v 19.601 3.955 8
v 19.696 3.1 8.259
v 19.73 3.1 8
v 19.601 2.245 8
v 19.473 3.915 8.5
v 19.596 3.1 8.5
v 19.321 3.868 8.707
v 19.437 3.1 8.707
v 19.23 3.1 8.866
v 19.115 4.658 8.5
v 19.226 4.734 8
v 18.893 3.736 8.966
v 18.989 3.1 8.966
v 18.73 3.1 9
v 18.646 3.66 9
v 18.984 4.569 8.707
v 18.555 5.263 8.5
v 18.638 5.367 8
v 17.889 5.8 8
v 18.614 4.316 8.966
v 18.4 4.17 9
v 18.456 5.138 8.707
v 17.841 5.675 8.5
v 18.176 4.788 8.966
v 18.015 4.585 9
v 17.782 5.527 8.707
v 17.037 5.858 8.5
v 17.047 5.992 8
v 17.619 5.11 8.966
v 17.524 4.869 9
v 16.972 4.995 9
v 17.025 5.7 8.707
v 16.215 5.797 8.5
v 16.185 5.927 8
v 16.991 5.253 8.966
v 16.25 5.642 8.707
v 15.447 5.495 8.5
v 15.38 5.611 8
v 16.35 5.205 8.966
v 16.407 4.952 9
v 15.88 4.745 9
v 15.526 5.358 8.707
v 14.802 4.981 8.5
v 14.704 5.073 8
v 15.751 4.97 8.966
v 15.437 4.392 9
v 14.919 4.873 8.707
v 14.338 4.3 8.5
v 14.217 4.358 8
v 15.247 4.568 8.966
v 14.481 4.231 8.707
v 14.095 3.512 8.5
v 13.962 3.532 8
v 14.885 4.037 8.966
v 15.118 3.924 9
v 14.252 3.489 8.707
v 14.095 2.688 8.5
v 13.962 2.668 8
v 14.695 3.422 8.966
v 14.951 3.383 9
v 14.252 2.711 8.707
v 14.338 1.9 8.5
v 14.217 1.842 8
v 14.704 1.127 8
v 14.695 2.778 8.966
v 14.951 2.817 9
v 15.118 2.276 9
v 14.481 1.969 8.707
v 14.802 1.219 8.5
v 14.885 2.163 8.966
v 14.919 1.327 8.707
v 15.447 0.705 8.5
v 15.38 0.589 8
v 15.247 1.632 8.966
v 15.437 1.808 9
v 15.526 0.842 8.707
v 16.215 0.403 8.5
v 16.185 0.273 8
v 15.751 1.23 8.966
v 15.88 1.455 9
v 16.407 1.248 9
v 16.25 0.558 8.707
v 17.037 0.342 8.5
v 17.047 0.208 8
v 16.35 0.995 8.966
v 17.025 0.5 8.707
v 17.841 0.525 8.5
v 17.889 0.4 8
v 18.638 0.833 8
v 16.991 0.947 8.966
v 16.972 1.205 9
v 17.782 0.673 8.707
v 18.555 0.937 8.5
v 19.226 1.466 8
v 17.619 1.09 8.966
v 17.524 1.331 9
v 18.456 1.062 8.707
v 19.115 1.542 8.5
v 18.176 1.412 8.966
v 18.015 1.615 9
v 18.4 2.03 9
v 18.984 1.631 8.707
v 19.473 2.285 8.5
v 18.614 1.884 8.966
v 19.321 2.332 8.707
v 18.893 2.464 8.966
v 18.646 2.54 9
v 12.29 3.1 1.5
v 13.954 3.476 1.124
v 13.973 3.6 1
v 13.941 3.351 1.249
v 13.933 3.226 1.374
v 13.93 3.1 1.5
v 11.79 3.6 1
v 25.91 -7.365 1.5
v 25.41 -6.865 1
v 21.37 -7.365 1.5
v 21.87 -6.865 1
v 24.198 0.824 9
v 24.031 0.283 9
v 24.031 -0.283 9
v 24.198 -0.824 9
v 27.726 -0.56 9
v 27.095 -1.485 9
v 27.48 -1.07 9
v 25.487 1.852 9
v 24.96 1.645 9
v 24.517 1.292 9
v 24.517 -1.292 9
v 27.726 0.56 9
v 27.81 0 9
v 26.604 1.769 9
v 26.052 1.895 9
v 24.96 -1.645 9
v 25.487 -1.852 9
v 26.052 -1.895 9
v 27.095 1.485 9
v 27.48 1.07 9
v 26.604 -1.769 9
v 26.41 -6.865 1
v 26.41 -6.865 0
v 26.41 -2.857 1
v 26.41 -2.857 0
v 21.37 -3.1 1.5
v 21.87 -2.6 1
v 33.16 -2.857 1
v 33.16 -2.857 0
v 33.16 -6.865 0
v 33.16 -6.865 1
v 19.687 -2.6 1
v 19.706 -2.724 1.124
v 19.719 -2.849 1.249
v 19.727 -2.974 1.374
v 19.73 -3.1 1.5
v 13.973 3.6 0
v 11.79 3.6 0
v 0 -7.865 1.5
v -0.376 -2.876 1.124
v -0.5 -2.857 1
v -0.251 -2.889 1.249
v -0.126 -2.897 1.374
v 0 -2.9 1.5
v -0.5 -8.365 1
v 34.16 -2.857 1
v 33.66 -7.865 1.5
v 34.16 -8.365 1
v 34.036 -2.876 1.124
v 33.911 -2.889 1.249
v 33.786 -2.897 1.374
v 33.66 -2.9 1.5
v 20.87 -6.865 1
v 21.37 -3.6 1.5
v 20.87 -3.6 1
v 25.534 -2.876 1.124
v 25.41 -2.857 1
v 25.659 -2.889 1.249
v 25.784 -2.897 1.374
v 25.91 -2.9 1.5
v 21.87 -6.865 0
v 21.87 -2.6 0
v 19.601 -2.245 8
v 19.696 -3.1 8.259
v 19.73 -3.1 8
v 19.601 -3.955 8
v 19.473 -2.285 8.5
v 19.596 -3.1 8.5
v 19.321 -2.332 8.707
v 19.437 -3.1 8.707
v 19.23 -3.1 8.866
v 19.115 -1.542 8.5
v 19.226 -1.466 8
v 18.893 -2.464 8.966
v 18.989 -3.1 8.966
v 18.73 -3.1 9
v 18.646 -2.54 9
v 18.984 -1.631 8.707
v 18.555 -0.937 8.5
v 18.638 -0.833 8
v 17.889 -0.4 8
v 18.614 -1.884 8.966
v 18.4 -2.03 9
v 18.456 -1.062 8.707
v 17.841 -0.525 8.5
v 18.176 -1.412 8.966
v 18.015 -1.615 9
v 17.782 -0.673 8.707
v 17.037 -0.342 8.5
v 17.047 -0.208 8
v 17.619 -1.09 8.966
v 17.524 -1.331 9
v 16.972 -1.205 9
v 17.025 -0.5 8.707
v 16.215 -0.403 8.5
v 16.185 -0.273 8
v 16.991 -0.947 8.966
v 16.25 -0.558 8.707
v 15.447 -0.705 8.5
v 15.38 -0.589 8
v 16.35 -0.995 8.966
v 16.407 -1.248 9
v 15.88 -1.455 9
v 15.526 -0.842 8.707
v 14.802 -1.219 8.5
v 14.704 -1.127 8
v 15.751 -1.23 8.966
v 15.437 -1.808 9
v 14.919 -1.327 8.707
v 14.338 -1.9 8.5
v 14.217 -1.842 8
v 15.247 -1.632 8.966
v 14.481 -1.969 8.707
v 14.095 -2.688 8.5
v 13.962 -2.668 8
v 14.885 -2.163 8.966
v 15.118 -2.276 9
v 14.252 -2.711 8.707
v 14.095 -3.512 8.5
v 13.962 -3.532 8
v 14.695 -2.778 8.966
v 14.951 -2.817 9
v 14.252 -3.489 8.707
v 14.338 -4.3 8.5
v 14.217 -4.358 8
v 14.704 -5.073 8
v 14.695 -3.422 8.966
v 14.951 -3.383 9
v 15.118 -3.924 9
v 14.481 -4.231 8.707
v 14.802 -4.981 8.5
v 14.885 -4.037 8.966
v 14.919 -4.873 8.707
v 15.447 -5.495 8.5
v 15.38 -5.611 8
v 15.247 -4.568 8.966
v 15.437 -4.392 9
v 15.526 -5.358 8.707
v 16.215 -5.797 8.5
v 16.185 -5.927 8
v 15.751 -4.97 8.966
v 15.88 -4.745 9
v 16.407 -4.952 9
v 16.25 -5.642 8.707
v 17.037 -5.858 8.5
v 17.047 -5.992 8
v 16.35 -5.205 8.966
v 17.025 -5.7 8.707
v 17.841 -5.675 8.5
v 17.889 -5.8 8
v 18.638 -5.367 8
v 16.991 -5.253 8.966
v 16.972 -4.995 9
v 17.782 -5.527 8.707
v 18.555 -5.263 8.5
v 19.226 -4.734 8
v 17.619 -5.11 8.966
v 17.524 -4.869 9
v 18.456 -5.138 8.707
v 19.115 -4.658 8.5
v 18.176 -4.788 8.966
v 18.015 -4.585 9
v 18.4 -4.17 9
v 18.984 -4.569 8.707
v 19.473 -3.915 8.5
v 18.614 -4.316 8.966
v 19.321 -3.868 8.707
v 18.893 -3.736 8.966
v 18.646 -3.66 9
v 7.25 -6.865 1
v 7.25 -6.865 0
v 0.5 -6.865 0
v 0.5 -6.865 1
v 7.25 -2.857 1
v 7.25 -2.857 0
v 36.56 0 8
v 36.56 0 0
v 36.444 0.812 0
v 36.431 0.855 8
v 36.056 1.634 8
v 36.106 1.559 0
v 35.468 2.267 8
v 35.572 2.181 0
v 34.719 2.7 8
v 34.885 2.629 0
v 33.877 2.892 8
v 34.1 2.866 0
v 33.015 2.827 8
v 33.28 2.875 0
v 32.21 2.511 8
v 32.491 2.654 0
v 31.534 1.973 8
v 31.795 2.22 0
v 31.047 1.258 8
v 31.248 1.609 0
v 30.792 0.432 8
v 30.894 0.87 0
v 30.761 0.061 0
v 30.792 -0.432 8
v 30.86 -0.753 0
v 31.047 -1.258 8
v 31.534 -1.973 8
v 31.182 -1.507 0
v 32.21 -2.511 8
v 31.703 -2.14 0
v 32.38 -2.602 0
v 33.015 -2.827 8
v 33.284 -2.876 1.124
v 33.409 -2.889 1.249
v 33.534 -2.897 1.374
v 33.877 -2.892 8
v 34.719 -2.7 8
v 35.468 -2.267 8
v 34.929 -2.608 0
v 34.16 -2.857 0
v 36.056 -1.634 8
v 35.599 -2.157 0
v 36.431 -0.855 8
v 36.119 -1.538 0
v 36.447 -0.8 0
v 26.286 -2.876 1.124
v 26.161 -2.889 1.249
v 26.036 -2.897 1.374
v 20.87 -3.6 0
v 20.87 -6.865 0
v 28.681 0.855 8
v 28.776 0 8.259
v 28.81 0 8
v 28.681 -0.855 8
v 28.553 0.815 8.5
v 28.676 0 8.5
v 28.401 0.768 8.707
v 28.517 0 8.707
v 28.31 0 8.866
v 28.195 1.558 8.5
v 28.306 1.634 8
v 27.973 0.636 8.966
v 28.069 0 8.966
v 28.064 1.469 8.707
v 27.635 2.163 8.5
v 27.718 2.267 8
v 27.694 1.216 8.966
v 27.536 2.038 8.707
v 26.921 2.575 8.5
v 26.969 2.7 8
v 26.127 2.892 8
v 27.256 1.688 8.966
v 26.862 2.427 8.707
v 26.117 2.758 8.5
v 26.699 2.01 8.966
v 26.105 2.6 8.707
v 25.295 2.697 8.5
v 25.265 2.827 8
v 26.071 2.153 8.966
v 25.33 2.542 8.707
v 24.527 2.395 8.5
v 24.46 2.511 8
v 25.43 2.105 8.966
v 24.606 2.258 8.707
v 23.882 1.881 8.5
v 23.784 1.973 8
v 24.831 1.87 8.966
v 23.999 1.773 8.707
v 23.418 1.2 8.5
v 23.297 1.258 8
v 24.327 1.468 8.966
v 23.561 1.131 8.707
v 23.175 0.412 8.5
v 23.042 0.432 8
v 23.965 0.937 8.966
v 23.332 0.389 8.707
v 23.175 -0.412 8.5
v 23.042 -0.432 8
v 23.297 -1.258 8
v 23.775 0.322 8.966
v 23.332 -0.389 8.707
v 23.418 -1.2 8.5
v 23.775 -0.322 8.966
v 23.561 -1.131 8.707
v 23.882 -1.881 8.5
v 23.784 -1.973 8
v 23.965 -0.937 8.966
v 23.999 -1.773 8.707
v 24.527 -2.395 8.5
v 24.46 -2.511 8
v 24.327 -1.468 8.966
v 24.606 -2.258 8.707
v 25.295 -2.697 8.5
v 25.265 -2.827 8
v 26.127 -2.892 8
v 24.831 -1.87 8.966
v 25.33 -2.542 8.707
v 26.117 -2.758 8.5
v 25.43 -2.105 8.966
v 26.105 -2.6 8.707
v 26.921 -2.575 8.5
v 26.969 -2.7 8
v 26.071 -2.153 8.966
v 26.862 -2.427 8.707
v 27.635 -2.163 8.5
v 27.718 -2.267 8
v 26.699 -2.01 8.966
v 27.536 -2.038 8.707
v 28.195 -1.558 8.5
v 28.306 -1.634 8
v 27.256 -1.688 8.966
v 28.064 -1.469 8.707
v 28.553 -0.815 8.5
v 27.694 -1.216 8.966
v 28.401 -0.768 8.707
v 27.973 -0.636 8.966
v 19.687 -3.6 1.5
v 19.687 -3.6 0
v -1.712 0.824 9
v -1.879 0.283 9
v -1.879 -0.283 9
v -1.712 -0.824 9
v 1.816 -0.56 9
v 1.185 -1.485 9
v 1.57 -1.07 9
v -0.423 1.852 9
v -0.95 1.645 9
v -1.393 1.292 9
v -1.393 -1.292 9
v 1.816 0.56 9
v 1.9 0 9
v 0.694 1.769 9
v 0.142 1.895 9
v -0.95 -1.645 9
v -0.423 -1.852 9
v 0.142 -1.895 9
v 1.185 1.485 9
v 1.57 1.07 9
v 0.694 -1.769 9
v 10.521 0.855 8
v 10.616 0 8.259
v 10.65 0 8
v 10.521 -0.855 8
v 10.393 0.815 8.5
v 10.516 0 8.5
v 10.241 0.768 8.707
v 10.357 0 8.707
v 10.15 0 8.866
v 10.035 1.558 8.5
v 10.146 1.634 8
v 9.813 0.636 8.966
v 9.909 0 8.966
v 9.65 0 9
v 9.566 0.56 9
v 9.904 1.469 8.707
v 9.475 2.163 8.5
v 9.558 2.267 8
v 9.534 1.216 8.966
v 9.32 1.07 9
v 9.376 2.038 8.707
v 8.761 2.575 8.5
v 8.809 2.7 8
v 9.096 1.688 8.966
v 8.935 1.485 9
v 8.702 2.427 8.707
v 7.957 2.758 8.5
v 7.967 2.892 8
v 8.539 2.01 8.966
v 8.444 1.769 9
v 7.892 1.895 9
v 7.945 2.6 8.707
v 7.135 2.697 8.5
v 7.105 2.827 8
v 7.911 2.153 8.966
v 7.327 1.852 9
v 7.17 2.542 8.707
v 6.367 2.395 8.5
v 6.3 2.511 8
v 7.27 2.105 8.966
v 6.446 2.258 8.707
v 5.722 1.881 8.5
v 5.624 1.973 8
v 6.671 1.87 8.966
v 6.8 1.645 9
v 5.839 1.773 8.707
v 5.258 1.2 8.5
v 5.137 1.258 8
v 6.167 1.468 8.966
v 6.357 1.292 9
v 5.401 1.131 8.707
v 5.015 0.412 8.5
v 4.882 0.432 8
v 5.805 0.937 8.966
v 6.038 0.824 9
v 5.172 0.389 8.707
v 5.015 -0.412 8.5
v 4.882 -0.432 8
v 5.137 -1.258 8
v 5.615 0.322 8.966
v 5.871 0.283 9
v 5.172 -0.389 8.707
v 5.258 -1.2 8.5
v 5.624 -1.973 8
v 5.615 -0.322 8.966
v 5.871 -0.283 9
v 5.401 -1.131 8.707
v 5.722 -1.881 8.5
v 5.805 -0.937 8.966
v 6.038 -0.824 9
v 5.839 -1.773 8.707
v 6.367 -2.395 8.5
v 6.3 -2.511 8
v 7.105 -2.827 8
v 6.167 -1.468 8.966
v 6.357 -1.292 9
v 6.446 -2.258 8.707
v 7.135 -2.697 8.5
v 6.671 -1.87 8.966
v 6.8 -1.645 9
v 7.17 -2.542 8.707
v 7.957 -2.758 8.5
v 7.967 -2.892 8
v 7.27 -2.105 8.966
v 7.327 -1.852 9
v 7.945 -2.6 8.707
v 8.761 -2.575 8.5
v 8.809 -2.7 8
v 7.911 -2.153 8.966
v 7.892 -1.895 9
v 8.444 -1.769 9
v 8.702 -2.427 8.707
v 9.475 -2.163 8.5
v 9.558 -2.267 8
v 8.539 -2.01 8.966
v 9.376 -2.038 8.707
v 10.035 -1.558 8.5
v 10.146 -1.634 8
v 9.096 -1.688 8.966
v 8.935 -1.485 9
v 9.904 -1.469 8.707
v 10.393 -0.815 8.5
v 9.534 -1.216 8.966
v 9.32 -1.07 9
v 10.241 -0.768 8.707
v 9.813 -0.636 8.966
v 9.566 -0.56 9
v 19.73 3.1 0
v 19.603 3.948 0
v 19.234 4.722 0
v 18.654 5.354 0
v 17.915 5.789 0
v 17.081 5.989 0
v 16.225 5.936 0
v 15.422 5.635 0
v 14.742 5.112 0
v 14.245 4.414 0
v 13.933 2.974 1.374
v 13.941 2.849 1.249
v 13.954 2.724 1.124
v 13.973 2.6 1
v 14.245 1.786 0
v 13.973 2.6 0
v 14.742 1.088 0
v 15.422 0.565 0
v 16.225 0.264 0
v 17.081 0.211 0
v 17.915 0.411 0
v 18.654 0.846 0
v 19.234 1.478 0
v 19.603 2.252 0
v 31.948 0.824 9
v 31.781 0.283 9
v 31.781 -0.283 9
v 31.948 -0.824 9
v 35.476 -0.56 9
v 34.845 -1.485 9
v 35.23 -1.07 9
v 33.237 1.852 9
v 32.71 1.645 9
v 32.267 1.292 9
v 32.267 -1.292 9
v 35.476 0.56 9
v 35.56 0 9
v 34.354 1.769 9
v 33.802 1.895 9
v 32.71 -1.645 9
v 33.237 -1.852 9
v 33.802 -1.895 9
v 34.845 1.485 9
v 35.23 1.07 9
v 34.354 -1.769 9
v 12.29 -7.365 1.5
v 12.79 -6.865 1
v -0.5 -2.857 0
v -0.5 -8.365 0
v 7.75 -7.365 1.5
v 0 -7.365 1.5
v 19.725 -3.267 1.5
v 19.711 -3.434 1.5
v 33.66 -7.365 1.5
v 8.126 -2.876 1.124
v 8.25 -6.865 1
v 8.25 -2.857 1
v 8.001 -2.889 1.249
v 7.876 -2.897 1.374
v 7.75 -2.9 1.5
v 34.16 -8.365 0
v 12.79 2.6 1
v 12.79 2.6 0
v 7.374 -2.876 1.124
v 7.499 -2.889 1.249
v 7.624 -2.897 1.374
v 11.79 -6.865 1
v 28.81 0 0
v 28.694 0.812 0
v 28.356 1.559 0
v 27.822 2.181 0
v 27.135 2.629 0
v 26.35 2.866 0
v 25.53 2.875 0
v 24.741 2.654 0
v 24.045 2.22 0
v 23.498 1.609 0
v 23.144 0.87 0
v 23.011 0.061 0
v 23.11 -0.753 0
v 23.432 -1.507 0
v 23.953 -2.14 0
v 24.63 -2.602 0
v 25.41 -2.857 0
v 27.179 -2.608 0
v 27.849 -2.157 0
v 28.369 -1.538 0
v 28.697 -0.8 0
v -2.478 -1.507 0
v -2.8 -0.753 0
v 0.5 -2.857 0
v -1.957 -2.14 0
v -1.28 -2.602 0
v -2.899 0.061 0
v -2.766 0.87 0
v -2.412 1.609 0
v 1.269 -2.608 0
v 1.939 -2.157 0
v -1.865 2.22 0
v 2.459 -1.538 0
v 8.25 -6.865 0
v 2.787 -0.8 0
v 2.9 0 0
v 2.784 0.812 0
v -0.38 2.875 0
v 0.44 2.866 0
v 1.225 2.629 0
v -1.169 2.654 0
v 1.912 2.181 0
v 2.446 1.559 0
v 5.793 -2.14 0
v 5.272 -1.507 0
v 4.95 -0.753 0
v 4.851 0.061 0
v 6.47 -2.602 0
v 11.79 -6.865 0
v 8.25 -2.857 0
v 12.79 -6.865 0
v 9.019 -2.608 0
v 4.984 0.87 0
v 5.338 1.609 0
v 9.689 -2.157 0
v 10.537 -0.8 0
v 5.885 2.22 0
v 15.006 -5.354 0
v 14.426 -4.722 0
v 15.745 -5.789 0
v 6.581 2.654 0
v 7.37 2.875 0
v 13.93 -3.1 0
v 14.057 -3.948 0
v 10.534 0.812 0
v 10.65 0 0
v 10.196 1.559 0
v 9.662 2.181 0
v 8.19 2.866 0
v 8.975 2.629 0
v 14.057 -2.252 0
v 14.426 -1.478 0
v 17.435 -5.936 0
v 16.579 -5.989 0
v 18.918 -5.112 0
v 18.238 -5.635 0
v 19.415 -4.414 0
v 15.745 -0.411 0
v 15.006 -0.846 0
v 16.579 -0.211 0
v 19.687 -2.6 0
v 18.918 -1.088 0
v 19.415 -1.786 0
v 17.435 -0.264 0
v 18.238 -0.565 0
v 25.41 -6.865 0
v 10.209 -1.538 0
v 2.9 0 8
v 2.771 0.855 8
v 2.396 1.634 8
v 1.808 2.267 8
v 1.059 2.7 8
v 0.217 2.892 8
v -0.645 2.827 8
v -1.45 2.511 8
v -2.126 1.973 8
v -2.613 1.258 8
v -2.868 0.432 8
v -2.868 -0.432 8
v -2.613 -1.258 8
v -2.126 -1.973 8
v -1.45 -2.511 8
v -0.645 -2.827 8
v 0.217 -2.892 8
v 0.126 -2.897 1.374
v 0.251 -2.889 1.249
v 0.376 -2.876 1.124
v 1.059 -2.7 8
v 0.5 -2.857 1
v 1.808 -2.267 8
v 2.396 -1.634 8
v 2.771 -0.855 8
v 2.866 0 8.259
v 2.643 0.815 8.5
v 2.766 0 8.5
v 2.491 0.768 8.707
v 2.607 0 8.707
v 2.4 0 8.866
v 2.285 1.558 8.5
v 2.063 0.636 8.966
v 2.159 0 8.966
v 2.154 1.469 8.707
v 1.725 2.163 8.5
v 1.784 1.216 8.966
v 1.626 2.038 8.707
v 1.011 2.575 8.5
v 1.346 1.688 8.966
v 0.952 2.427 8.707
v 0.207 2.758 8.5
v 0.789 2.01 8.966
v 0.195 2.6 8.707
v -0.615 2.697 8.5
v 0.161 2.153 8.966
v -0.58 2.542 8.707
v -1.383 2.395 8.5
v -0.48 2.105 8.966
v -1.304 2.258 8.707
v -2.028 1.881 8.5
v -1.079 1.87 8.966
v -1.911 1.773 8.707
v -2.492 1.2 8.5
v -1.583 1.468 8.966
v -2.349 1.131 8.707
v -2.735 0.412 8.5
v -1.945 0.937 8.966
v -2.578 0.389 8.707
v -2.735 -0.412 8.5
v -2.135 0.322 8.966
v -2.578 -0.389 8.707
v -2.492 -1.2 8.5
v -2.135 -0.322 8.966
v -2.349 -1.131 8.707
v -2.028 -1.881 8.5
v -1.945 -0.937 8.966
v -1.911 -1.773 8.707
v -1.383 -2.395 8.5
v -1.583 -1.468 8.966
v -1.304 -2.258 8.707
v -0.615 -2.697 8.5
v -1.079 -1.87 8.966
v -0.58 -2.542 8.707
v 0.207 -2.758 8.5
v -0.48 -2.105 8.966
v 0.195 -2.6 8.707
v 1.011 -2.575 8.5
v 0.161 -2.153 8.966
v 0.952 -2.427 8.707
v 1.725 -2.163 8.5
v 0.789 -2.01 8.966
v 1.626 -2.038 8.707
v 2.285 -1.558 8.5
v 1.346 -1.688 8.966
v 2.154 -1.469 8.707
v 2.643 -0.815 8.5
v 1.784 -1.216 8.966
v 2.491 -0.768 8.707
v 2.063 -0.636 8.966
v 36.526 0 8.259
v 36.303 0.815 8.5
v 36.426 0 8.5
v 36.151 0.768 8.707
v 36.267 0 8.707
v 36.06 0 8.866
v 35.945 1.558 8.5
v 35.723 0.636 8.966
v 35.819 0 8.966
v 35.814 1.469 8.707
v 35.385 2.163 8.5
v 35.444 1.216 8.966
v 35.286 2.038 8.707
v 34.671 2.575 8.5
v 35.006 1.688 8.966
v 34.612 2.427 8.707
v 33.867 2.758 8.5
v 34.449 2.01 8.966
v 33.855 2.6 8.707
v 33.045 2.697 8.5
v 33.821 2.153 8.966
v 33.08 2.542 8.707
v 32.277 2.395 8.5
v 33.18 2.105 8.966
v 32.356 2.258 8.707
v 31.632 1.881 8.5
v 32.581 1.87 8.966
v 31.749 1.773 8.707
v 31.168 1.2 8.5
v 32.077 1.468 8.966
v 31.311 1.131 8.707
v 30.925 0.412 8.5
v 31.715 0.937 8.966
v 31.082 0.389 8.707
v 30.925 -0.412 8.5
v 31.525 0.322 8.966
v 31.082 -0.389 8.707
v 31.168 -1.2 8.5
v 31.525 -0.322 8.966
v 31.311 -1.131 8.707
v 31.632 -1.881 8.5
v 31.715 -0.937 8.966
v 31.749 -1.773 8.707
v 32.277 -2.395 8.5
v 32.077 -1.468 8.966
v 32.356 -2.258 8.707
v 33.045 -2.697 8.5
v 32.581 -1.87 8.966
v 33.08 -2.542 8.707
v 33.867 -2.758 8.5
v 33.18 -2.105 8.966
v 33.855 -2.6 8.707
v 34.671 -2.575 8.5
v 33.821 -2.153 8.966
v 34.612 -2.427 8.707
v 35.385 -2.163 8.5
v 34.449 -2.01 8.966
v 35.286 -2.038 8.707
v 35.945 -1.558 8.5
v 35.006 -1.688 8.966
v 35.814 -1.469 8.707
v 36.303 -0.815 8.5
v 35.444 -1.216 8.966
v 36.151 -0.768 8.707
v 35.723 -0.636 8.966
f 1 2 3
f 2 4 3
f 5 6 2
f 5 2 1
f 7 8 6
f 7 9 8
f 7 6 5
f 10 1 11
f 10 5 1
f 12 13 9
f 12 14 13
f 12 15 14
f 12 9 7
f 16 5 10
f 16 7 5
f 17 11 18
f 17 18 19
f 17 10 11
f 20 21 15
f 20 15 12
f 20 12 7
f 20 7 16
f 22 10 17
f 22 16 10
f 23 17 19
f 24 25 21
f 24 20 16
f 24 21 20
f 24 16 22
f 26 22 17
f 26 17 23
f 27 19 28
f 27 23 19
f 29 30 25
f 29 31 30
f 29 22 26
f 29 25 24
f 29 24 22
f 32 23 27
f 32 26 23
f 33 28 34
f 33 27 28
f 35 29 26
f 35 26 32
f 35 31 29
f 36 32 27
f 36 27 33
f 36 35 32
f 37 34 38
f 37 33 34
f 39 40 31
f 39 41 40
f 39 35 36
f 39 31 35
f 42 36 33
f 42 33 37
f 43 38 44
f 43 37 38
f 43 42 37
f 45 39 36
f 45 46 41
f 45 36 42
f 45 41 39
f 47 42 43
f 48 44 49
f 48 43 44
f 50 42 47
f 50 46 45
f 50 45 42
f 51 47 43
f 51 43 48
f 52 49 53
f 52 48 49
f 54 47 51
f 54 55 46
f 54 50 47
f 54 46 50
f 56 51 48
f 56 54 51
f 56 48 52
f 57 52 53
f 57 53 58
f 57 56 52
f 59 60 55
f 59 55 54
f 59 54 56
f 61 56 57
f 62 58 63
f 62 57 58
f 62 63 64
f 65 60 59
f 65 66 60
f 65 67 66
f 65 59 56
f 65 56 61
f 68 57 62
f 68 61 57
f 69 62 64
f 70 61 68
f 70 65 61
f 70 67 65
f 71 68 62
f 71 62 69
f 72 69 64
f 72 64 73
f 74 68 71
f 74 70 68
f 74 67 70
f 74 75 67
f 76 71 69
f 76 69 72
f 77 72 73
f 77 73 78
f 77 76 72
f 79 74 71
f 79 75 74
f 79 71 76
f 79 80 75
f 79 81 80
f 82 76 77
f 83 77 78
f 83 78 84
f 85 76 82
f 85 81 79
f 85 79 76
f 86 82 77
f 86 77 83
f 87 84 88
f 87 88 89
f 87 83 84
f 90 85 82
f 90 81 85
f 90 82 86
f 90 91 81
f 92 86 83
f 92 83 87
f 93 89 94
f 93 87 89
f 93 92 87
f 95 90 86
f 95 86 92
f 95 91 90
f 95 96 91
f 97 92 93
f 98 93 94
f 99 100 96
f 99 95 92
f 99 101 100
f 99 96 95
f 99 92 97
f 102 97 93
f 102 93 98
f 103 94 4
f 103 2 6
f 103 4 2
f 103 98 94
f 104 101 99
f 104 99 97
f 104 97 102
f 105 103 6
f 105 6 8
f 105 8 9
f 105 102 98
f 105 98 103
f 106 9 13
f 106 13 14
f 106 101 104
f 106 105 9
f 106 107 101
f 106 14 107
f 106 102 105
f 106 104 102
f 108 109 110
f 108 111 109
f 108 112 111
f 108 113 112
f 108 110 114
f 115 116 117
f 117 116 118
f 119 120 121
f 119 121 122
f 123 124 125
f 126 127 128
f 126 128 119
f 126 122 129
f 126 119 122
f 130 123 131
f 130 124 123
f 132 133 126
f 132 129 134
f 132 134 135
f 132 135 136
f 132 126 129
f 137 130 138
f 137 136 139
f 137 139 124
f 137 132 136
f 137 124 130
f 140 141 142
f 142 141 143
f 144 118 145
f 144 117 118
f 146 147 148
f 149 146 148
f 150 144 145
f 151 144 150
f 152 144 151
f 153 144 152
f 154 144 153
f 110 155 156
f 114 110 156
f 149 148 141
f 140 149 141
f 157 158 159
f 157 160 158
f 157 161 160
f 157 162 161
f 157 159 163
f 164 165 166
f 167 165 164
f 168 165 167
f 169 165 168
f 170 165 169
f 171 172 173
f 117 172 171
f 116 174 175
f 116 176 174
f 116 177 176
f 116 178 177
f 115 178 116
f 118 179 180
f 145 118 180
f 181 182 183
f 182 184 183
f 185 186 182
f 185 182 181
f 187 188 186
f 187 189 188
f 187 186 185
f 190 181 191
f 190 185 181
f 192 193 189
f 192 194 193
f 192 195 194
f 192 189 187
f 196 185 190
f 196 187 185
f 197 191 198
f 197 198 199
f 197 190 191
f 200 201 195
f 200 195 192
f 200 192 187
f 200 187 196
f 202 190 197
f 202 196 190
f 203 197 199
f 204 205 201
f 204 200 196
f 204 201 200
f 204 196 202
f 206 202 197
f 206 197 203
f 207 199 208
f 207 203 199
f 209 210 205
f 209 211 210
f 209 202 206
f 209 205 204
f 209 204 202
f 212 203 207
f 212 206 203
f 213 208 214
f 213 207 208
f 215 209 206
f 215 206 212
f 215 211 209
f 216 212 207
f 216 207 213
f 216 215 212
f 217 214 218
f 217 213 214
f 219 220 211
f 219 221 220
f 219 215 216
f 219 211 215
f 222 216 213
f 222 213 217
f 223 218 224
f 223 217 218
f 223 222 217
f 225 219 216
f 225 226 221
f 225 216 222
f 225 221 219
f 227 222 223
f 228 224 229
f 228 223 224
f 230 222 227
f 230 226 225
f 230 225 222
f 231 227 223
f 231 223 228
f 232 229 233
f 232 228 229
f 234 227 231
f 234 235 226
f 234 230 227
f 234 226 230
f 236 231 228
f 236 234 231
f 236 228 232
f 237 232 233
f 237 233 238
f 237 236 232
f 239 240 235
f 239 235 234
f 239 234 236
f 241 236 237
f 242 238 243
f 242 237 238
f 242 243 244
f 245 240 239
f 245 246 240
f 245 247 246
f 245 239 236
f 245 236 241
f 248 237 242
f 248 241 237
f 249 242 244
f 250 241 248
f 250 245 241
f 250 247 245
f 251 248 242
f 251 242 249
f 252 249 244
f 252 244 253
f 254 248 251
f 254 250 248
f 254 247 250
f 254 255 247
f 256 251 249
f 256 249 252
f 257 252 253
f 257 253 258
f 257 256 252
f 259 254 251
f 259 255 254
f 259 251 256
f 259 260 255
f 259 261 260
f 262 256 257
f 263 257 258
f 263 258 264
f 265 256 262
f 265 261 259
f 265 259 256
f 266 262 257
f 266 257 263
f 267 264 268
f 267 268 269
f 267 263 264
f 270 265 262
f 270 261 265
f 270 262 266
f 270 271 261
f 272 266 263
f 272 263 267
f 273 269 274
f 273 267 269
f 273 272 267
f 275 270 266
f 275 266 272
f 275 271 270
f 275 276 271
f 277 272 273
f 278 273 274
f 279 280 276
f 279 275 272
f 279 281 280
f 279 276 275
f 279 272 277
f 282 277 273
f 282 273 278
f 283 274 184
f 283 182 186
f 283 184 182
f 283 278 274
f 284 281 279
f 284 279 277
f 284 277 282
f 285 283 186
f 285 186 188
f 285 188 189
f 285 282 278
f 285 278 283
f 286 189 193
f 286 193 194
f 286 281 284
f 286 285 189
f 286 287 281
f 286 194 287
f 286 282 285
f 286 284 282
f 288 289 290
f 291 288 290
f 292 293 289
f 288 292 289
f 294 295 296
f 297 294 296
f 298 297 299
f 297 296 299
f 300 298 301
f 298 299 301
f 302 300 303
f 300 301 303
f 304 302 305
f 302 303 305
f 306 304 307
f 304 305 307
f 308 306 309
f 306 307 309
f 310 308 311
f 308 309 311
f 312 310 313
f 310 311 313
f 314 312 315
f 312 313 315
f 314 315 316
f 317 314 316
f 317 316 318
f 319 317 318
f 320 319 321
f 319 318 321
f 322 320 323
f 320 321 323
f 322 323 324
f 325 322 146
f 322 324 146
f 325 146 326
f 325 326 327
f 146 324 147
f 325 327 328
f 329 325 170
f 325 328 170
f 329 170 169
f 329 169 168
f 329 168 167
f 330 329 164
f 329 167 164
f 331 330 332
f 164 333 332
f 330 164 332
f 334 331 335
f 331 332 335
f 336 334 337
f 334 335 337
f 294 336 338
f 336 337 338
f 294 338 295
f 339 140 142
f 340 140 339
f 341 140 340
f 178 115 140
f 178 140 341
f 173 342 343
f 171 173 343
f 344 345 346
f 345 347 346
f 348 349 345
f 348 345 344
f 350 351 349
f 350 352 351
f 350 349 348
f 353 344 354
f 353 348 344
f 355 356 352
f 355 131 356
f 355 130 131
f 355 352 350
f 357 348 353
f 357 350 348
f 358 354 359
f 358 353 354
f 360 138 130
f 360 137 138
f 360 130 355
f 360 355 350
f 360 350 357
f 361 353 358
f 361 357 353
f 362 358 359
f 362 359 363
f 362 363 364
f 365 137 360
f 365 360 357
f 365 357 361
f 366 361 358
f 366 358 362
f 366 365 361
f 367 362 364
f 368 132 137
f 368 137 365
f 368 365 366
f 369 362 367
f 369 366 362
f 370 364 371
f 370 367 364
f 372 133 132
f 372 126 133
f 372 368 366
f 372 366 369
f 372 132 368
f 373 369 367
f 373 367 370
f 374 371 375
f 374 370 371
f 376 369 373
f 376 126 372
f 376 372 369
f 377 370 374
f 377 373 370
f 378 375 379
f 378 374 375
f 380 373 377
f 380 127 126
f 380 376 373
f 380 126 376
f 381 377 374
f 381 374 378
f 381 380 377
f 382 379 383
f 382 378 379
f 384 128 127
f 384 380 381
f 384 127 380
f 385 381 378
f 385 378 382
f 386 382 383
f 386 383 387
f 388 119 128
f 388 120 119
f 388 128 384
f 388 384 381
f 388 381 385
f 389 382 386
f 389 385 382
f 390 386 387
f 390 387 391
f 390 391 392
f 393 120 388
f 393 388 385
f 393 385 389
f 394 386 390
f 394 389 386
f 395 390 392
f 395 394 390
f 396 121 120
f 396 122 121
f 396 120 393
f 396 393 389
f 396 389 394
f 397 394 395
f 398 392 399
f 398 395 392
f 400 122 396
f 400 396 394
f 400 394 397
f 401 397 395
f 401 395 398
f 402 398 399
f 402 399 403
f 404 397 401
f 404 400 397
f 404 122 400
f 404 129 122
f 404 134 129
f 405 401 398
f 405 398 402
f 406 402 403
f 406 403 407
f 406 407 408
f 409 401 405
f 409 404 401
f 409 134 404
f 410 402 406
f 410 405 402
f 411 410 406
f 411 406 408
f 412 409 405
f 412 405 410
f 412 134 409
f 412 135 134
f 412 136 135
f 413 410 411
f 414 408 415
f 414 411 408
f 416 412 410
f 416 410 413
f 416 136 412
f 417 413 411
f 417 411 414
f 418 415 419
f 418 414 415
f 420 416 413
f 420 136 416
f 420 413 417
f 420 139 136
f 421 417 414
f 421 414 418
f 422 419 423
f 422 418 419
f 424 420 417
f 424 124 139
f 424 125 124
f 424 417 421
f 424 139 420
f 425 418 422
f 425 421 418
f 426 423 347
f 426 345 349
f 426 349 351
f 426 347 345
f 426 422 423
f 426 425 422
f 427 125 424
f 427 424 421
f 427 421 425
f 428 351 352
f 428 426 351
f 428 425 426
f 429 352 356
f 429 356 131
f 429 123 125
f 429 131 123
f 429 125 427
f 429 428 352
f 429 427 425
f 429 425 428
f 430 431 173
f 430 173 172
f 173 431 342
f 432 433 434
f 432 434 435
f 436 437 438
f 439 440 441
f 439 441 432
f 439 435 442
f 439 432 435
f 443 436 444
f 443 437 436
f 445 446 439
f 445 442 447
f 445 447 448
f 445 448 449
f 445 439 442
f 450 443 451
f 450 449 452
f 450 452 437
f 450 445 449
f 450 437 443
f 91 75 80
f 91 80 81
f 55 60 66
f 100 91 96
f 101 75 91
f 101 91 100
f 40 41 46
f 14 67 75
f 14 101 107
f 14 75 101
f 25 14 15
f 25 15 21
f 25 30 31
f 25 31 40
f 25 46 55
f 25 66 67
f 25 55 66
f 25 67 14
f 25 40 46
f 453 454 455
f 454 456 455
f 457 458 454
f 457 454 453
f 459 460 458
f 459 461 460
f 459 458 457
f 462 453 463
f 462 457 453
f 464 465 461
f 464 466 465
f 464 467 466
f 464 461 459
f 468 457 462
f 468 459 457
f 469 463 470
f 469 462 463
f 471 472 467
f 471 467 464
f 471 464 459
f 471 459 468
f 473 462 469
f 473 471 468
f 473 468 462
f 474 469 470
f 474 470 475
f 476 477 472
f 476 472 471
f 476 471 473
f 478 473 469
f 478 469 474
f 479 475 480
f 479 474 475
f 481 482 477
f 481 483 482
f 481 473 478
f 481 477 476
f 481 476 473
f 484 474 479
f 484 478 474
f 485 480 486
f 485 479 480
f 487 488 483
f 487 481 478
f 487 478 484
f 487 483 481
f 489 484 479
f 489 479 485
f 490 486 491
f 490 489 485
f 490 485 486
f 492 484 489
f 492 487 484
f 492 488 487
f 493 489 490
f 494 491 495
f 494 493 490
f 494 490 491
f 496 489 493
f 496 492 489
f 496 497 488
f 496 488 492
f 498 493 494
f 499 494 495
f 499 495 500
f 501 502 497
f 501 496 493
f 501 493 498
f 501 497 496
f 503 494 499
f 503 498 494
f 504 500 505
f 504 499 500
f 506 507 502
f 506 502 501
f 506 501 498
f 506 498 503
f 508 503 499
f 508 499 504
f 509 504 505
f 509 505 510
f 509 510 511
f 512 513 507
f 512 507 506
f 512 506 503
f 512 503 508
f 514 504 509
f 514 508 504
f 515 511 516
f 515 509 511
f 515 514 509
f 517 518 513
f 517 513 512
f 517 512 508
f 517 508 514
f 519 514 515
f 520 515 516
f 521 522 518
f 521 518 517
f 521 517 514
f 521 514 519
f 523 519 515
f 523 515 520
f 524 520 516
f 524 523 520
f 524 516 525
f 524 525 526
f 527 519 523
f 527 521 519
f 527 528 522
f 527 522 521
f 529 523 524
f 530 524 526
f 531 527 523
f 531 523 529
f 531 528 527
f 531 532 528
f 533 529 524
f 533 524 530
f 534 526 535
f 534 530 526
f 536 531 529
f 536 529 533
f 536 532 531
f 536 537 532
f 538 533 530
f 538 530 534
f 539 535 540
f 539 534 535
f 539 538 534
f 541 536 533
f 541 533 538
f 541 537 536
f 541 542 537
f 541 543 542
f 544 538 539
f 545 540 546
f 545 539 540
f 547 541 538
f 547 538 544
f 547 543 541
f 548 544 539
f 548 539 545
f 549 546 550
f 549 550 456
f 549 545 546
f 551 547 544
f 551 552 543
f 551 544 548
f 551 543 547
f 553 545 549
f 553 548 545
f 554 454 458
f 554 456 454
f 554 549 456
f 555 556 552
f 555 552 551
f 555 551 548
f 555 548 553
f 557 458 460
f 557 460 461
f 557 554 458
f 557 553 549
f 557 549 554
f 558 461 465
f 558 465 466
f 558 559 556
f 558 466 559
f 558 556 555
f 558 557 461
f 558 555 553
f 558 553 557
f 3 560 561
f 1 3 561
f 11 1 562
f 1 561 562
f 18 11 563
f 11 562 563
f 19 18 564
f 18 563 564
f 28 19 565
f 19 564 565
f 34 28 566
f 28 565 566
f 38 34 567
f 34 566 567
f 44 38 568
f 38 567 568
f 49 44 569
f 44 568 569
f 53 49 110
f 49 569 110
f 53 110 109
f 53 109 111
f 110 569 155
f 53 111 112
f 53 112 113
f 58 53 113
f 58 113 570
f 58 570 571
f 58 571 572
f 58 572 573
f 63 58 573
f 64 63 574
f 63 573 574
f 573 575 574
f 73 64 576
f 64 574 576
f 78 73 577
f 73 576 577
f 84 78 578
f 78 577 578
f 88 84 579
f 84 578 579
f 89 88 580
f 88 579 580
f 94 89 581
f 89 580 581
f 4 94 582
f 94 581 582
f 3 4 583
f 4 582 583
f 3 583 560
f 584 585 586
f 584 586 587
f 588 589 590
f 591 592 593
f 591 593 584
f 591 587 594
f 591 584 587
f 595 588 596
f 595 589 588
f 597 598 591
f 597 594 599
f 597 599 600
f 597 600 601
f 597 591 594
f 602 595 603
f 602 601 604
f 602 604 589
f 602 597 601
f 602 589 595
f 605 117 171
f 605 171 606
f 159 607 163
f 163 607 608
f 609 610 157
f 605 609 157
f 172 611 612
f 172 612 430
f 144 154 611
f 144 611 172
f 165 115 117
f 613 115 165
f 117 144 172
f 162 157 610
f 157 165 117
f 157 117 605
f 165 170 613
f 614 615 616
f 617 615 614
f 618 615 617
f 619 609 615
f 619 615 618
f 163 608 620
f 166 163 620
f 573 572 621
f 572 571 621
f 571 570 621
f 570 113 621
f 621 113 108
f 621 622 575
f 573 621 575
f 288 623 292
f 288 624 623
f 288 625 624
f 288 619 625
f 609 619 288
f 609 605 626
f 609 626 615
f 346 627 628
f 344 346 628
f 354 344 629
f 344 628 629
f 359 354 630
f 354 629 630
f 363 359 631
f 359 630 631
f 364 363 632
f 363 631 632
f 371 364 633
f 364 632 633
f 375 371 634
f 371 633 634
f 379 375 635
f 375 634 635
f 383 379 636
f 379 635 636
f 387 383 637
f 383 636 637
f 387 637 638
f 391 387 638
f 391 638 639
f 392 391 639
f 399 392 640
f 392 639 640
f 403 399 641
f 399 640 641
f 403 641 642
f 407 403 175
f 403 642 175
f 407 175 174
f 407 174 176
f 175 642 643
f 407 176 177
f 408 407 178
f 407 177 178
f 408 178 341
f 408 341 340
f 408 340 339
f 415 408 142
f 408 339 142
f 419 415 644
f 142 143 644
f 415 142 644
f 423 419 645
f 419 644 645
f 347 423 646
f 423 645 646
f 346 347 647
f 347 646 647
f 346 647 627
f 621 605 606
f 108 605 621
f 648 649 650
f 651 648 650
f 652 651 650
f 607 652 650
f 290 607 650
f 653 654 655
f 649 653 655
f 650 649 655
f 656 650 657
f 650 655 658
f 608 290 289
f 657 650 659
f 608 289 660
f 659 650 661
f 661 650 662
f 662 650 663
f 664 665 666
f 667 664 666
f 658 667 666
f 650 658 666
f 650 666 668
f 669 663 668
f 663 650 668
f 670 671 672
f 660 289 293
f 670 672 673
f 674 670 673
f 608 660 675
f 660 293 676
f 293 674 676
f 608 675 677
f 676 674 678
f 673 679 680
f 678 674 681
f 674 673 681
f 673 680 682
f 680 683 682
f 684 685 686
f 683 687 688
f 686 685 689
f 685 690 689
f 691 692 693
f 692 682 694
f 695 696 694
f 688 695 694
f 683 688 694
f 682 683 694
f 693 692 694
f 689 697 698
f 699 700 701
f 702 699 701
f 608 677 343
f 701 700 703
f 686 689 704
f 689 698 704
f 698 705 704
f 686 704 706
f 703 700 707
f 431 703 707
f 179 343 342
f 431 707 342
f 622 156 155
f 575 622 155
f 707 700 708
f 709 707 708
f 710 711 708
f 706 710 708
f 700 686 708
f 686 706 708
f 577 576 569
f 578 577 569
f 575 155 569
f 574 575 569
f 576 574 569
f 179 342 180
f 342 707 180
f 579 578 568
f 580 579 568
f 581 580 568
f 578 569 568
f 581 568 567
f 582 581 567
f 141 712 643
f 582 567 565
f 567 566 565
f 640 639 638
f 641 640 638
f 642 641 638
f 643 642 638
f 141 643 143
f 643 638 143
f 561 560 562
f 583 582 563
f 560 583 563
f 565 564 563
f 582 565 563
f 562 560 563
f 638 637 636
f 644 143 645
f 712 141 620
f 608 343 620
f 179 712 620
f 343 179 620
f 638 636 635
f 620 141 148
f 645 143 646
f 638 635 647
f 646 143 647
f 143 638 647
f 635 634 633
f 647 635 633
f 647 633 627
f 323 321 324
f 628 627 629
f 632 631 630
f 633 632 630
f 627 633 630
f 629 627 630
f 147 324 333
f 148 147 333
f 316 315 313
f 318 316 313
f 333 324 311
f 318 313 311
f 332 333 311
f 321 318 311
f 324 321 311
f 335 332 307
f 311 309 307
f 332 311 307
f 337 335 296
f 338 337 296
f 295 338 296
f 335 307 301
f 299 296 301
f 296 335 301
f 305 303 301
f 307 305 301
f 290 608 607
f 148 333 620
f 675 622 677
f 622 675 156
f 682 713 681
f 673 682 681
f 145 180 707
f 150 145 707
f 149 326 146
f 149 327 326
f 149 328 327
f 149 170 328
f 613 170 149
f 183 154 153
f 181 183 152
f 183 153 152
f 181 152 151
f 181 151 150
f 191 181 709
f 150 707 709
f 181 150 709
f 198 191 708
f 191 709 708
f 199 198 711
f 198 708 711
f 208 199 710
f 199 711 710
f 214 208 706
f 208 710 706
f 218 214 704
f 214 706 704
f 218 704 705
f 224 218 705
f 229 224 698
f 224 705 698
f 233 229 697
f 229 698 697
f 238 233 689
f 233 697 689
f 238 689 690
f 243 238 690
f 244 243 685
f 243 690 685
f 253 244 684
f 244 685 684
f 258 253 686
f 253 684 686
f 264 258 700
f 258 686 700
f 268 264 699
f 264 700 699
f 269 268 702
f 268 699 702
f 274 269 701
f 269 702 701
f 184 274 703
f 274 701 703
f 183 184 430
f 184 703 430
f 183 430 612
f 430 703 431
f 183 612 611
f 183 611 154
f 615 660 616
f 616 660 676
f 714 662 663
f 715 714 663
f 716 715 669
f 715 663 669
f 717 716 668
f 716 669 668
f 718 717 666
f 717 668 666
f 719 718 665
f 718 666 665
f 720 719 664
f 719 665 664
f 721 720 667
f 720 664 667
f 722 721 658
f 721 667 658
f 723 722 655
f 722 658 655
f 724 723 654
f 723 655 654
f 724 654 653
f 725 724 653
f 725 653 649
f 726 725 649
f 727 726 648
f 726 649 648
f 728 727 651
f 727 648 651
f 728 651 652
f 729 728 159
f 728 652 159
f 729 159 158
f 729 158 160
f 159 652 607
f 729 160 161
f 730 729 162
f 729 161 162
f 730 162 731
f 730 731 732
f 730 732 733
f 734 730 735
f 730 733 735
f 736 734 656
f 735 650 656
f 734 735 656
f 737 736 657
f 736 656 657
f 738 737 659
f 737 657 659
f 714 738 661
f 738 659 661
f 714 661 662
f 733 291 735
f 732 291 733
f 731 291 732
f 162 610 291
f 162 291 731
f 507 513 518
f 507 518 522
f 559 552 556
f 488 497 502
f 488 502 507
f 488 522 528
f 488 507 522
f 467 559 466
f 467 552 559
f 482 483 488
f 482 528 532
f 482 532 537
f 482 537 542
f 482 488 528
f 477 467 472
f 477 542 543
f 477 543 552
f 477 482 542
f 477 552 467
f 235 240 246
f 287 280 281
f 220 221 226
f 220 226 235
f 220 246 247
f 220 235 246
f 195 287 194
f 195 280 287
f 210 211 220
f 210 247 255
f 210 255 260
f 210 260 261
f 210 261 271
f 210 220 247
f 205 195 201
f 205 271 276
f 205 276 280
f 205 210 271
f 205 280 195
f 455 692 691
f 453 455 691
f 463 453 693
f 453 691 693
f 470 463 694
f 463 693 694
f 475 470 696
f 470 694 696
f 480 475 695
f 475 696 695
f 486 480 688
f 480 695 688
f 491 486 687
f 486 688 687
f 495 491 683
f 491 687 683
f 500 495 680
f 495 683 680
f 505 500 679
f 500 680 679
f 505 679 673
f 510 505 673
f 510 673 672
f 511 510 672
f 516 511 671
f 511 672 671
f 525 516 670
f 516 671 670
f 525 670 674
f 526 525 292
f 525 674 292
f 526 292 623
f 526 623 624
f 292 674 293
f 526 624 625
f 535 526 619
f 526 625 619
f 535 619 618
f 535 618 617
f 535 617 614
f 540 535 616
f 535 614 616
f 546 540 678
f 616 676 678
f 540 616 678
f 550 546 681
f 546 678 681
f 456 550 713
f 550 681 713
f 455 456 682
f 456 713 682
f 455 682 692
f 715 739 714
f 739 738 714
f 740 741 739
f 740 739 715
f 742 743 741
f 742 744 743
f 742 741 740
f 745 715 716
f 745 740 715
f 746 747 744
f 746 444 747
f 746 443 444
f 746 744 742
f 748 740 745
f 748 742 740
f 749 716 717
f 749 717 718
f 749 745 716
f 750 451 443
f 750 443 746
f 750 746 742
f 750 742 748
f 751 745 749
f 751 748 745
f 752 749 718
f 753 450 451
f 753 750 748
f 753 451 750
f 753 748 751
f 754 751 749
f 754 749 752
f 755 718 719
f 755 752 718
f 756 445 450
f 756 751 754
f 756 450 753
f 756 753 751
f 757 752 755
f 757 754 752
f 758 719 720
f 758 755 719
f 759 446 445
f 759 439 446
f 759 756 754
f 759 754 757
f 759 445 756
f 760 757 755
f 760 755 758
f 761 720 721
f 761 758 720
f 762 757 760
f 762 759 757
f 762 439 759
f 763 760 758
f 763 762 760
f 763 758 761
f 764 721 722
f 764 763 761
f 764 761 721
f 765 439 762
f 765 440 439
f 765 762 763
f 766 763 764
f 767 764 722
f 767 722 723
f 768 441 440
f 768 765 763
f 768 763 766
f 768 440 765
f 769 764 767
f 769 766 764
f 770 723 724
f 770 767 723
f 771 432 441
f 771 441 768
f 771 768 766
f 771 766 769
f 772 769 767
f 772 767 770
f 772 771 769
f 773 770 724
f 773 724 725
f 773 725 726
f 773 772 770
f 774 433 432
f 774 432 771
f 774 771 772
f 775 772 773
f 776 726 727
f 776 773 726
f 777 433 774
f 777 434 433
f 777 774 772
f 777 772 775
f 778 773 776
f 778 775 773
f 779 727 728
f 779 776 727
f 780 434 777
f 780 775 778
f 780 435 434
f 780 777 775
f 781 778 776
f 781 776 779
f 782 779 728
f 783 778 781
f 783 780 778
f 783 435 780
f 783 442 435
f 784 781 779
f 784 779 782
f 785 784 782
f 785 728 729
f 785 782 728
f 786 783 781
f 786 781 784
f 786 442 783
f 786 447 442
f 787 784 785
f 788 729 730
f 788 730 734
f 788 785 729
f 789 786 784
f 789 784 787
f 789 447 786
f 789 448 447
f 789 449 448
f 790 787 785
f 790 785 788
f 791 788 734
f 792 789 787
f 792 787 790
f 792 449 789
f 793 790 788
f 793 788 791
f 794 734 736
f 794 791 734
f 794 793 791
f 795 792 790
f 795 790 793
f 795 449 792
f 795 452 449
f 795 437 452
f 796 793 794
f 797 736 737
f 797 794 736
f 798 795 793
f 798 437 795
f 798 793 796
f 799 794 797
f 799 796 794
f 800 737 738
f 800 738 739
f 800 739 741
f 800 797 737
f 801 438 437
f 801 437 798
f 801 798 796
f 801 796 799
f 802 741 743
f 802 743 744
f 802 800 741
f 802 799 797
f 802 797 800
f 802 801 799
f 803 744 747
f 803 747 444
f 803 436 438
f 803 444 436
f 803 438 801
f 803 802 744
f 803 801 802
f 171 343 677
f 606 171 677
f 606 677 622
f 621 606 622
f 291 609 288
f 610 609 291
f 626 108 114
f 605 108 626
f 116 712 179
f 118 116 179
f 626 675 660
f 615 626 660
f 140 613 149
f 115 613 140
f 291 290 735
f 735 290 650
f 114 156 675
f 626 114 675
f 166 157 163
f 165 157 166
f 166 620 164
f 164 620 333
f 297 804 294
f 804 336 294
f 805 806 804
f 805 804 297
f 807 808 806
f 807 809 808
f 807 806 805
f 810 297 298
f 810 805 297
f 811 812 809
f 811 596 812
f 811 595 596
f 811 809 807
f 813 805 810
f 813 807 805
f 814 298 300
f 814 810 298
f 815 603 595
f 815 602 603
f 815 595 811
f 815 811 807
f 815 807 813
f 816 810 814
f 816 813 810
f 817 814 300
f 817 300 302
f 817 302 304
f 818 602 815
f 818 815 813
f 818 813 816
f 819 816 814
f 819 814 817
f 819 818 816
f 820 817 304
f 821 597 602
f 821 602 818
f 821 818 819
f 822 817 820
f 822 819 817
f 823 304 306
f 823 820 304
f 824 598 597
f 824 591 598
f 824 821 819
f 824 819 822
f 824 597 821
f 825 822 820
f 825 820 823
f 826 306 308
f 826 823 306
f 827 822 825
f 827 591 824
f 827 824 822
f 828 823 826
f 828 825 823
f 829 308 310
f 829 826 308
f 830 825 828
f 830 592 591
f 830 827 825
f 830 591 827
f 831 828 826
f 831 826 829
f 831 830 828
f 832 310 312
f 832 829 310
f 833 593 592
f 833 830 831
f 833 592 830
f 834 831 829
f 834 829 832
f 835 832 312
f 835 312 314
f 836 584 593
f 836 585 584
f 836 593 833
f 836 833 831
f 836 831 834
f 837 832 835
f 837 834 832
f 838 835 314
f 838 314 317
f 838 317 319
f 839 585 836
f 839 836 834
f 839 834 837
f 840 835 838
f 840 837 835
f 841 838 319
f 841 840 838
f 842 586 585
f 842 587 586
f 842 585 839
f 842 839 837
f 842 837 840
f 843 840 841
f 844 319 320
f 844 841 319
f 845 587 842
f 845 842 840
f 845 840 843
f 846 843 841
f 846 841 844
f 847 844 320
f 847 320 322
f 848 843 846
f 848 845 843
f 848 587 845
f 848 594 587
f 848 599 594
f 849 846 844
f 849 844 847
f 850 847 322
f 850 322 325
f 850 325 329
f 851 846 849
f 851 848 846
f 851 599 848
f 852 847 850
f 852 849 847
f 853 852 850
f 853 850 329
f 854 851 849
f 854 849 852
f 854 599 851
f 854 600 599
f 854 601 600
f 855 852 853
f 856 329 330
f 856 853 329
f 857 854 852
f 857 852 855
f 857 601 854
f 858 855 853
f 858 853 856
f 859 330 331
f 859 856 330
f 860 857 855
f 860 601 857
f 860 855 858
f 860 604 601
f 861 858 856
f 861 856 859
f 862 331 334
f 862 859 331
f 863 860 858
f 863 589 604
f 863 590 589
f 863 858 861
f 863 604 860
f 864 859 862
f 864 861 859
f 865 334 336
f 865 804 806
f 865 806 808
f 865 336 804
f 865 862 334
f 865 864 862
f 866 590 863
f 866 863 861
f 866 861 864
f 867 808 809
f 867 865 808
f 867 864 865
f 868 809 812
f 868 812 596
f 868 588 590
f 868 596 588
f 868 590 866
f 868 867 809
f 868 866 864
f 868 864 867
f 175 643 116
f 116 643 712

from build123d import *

# Parameters (mm, degrees)
SKETCH_1_R        = 2.9
EXTRUDE_1_DEPTH   = 9
EXTRUDE_1_2_DEPTH = 9
EXTRUDE_1_3_DEPTH = 9
EXTRUDE_1_4_DEPTH = 9
EXTRUDE_1_5_DEPTH = 9
EXTRUDE_1_6_DEPTH = 9
EXTRUDE_2_DEPTH   = 1.5
CHAMFER_1_SIZE    = 0.5
CHAMFER_2_SIZE    = 0.5
CHAMFER_3_SIZE    = 0.5
CHAMFER_4_SIZE    = 0.5
FILLET_2_R        = 1


with BuildPart() as part:
    # Эскиз1 → Бобышка-Вытянуть1 (new body)
    with BuildSketch(Plane.XY):
        with Locations((33.66, 0)):
            Circle(SKETCH_1_R)
    extrude(amount=EXTRUDE_1_DEPTH)



with BuildPart() as body_2:
    # Эскиз1 → Extrude 1 2 (new body)
    with BuildSketch(Plane.XY):
        with Locations((25.91, 0)):
            Circle(SKETCH_1_R)
    extrude(amount=EXTRUDE_1_2_DEPTH)


with BuildPart() as body_3:
    # Эскиз1 → Extrude 1 3 (new body)
    with BuildSketch(Plane.XY):
        with Locations((16.83, -3.1)):
            Circle(SKETCH_1_R)
    extrude(amount=EXTRUDE_1_3_DEPTH)


with BuildPart() as body_4:
    # Эскиз1 → Extrude 1 4 (new body)
    with BuildSketch(Plane.XY):
        with Locations((7.75, 0)):
            Circle(SKETCH_1_R)
    extrude(amount=EXTRUDE_1_4_DEPTH)


with BuildPart() as body_5:
    # Эскиз1 → Extrude 1 5 (new body)
    with BuildSketch(Plane.XY):
        Circle(SKETCH_1_R)
    extrude(amount=EXTRUDE_1_5_DEPTH)


with BuildPart() as body_6:
    # Эскиз1 → Extrude 1 6 (new body)
    with BuildSketch(Plane.XY):
        with Locations((16.83, 3.1)):
            Circle(SKETCH_1_R)
    extrude(amount=EXTRUDE_1_6_DEPTH)


with BuildPart() as part_1:
    add(part.part)

    add(body_2.part)  # Бобышка-Вытянуть2 merges body 2

    add(body_3.part)  # Бобышка-Вытянуть2 merges body 3

    add(body_4.part)  # Бобышка-Вытянуть2 merges body 4

    add(body_5.part)  # Бобышка-Вытянуть2 merges body 5

    add(body_6.part)  # Бобышка-Вытянуть2 merges body 6
    # Эскиз2 → Бобышка-Вытянуть2 (add)
    with BuildSketch(Plane(origin=(0, 0, 0), x_dir=(-1, 0, 0), z_dir=(0, 0, -1))):
        Polygon((0, 0), (0.5, 0), (0.5, -8.365233443), (-34.16, -8.365233443), (-34.16, 0), (-33.66, 0), (-33.16, 0), (-33.16, -6.865233443), (-26.41, -6.865233443), (-26.41, 0), (-25.41, 0), (-25.41, -6.865233443), (-21.87, -6.865233443), (-21.87, -2.6), (-16.83, -2.6), (-16.83, -3.1), (-16.83, -3.6), (-20.87, -3.6), (-20.87, -6.865233443), (-12.79, -6.865233443), (-12.79, 2.6), (-16.83, 2.6), (-16.83, 3.1), (-16.83, 3.6), (-11.79, 3.6), (-11.79, -6.865233443), (-8.25, -6.865233443), (-8.25, 0), (-7.75, 0), (-7.25, 0), (-7.25, -6.865233443), (-0.5, -6.865233443), (-0.5, 0), align=None)
    extrude(amount=-EXTRUDE_2_DEPTH)

    # Фаска1
    chamfer_1_edges = [part_1.edges().sort_by_distance(p)[0] for p in [
        (12.79, -2.132616721, 1.5),
        (16.83, -6.865233443, 1.5),
        (20.87, -5.232616721, 1.5),
        (20.778285686, -2.6, 1.5),
        (21.87, -4.732616721, 1.5),
        (25.41, -4.860902407, 1.5),
        (26.41, -4.860902407, 1.5),
        (29.785, -6.865233443, 1.5),
        (33.16, -4.860902407, 1.5),
        (16.83, -8.365233443, 1.5),
        (34.16, -5.610902407, 1.5),
    ]]
    chamfer(chamfer_1_edges, length=CHAMFER_1_SIZE - 0.0001)  # a hair under: the kernel refuses the full size

    # Фаска2
    chamfer_2_edges = [part_1.edges().sort_by_distance(p)[0] for p in [
        (13.131764314, 2.6, 1.5),
    ]]
    chamfer(chamfer_2_edges, length=CHAMFER_2_SIZE - 0.0001)  # a hair under: the kernel refuses the full size

    # Фаска3
    chamfer_3_edges = [part_1.edges().sort_by_distance(p)[0] for p in [
        (-0.5, -5.360952407, 1.5),
        (0.5, -4.860902407, 1.5),
        (3.875, -6.865233443, 1.5),
        (7.25, -4.860902407, 1.5),
        (8.25, -4.860902407, 1.5),
        (10.02, -6.865233443, 1.5),
        (11.79, -1.632616721, 1.5),
        (12.881714314, 3.6, 1.5),
    ]]
    chamfer(chamfer_3_edges, length=CHAMFER_3_SIZE - 0.0001)  # a hair under: the kernel refuses the full size

    # Фаска4
    chamfer_4_edges = [part_1.edges().sort_by_distance(p)[0] for p in [
        (23.64, -6.865233443, 1.5),
    ]]
    chamfer(chamfer_4_edges, length=CHAMFER_4_SIZE)

    # Скругление2
    fillet_2_edges = [part_1.edges().sort_by_distance(p)[0] for p in [
        (30.76, 0, 9),
        (23.01, 0, 9),
        (4.85, 0, 9),
        (-2.9, 0, 9),
        (13.93, 3.1, 9),
        (13.93, -3.1, 9),
    ]]
    fillet(fillet_2_edges, radius=FILLET_2_R)


solid = part_1.part
